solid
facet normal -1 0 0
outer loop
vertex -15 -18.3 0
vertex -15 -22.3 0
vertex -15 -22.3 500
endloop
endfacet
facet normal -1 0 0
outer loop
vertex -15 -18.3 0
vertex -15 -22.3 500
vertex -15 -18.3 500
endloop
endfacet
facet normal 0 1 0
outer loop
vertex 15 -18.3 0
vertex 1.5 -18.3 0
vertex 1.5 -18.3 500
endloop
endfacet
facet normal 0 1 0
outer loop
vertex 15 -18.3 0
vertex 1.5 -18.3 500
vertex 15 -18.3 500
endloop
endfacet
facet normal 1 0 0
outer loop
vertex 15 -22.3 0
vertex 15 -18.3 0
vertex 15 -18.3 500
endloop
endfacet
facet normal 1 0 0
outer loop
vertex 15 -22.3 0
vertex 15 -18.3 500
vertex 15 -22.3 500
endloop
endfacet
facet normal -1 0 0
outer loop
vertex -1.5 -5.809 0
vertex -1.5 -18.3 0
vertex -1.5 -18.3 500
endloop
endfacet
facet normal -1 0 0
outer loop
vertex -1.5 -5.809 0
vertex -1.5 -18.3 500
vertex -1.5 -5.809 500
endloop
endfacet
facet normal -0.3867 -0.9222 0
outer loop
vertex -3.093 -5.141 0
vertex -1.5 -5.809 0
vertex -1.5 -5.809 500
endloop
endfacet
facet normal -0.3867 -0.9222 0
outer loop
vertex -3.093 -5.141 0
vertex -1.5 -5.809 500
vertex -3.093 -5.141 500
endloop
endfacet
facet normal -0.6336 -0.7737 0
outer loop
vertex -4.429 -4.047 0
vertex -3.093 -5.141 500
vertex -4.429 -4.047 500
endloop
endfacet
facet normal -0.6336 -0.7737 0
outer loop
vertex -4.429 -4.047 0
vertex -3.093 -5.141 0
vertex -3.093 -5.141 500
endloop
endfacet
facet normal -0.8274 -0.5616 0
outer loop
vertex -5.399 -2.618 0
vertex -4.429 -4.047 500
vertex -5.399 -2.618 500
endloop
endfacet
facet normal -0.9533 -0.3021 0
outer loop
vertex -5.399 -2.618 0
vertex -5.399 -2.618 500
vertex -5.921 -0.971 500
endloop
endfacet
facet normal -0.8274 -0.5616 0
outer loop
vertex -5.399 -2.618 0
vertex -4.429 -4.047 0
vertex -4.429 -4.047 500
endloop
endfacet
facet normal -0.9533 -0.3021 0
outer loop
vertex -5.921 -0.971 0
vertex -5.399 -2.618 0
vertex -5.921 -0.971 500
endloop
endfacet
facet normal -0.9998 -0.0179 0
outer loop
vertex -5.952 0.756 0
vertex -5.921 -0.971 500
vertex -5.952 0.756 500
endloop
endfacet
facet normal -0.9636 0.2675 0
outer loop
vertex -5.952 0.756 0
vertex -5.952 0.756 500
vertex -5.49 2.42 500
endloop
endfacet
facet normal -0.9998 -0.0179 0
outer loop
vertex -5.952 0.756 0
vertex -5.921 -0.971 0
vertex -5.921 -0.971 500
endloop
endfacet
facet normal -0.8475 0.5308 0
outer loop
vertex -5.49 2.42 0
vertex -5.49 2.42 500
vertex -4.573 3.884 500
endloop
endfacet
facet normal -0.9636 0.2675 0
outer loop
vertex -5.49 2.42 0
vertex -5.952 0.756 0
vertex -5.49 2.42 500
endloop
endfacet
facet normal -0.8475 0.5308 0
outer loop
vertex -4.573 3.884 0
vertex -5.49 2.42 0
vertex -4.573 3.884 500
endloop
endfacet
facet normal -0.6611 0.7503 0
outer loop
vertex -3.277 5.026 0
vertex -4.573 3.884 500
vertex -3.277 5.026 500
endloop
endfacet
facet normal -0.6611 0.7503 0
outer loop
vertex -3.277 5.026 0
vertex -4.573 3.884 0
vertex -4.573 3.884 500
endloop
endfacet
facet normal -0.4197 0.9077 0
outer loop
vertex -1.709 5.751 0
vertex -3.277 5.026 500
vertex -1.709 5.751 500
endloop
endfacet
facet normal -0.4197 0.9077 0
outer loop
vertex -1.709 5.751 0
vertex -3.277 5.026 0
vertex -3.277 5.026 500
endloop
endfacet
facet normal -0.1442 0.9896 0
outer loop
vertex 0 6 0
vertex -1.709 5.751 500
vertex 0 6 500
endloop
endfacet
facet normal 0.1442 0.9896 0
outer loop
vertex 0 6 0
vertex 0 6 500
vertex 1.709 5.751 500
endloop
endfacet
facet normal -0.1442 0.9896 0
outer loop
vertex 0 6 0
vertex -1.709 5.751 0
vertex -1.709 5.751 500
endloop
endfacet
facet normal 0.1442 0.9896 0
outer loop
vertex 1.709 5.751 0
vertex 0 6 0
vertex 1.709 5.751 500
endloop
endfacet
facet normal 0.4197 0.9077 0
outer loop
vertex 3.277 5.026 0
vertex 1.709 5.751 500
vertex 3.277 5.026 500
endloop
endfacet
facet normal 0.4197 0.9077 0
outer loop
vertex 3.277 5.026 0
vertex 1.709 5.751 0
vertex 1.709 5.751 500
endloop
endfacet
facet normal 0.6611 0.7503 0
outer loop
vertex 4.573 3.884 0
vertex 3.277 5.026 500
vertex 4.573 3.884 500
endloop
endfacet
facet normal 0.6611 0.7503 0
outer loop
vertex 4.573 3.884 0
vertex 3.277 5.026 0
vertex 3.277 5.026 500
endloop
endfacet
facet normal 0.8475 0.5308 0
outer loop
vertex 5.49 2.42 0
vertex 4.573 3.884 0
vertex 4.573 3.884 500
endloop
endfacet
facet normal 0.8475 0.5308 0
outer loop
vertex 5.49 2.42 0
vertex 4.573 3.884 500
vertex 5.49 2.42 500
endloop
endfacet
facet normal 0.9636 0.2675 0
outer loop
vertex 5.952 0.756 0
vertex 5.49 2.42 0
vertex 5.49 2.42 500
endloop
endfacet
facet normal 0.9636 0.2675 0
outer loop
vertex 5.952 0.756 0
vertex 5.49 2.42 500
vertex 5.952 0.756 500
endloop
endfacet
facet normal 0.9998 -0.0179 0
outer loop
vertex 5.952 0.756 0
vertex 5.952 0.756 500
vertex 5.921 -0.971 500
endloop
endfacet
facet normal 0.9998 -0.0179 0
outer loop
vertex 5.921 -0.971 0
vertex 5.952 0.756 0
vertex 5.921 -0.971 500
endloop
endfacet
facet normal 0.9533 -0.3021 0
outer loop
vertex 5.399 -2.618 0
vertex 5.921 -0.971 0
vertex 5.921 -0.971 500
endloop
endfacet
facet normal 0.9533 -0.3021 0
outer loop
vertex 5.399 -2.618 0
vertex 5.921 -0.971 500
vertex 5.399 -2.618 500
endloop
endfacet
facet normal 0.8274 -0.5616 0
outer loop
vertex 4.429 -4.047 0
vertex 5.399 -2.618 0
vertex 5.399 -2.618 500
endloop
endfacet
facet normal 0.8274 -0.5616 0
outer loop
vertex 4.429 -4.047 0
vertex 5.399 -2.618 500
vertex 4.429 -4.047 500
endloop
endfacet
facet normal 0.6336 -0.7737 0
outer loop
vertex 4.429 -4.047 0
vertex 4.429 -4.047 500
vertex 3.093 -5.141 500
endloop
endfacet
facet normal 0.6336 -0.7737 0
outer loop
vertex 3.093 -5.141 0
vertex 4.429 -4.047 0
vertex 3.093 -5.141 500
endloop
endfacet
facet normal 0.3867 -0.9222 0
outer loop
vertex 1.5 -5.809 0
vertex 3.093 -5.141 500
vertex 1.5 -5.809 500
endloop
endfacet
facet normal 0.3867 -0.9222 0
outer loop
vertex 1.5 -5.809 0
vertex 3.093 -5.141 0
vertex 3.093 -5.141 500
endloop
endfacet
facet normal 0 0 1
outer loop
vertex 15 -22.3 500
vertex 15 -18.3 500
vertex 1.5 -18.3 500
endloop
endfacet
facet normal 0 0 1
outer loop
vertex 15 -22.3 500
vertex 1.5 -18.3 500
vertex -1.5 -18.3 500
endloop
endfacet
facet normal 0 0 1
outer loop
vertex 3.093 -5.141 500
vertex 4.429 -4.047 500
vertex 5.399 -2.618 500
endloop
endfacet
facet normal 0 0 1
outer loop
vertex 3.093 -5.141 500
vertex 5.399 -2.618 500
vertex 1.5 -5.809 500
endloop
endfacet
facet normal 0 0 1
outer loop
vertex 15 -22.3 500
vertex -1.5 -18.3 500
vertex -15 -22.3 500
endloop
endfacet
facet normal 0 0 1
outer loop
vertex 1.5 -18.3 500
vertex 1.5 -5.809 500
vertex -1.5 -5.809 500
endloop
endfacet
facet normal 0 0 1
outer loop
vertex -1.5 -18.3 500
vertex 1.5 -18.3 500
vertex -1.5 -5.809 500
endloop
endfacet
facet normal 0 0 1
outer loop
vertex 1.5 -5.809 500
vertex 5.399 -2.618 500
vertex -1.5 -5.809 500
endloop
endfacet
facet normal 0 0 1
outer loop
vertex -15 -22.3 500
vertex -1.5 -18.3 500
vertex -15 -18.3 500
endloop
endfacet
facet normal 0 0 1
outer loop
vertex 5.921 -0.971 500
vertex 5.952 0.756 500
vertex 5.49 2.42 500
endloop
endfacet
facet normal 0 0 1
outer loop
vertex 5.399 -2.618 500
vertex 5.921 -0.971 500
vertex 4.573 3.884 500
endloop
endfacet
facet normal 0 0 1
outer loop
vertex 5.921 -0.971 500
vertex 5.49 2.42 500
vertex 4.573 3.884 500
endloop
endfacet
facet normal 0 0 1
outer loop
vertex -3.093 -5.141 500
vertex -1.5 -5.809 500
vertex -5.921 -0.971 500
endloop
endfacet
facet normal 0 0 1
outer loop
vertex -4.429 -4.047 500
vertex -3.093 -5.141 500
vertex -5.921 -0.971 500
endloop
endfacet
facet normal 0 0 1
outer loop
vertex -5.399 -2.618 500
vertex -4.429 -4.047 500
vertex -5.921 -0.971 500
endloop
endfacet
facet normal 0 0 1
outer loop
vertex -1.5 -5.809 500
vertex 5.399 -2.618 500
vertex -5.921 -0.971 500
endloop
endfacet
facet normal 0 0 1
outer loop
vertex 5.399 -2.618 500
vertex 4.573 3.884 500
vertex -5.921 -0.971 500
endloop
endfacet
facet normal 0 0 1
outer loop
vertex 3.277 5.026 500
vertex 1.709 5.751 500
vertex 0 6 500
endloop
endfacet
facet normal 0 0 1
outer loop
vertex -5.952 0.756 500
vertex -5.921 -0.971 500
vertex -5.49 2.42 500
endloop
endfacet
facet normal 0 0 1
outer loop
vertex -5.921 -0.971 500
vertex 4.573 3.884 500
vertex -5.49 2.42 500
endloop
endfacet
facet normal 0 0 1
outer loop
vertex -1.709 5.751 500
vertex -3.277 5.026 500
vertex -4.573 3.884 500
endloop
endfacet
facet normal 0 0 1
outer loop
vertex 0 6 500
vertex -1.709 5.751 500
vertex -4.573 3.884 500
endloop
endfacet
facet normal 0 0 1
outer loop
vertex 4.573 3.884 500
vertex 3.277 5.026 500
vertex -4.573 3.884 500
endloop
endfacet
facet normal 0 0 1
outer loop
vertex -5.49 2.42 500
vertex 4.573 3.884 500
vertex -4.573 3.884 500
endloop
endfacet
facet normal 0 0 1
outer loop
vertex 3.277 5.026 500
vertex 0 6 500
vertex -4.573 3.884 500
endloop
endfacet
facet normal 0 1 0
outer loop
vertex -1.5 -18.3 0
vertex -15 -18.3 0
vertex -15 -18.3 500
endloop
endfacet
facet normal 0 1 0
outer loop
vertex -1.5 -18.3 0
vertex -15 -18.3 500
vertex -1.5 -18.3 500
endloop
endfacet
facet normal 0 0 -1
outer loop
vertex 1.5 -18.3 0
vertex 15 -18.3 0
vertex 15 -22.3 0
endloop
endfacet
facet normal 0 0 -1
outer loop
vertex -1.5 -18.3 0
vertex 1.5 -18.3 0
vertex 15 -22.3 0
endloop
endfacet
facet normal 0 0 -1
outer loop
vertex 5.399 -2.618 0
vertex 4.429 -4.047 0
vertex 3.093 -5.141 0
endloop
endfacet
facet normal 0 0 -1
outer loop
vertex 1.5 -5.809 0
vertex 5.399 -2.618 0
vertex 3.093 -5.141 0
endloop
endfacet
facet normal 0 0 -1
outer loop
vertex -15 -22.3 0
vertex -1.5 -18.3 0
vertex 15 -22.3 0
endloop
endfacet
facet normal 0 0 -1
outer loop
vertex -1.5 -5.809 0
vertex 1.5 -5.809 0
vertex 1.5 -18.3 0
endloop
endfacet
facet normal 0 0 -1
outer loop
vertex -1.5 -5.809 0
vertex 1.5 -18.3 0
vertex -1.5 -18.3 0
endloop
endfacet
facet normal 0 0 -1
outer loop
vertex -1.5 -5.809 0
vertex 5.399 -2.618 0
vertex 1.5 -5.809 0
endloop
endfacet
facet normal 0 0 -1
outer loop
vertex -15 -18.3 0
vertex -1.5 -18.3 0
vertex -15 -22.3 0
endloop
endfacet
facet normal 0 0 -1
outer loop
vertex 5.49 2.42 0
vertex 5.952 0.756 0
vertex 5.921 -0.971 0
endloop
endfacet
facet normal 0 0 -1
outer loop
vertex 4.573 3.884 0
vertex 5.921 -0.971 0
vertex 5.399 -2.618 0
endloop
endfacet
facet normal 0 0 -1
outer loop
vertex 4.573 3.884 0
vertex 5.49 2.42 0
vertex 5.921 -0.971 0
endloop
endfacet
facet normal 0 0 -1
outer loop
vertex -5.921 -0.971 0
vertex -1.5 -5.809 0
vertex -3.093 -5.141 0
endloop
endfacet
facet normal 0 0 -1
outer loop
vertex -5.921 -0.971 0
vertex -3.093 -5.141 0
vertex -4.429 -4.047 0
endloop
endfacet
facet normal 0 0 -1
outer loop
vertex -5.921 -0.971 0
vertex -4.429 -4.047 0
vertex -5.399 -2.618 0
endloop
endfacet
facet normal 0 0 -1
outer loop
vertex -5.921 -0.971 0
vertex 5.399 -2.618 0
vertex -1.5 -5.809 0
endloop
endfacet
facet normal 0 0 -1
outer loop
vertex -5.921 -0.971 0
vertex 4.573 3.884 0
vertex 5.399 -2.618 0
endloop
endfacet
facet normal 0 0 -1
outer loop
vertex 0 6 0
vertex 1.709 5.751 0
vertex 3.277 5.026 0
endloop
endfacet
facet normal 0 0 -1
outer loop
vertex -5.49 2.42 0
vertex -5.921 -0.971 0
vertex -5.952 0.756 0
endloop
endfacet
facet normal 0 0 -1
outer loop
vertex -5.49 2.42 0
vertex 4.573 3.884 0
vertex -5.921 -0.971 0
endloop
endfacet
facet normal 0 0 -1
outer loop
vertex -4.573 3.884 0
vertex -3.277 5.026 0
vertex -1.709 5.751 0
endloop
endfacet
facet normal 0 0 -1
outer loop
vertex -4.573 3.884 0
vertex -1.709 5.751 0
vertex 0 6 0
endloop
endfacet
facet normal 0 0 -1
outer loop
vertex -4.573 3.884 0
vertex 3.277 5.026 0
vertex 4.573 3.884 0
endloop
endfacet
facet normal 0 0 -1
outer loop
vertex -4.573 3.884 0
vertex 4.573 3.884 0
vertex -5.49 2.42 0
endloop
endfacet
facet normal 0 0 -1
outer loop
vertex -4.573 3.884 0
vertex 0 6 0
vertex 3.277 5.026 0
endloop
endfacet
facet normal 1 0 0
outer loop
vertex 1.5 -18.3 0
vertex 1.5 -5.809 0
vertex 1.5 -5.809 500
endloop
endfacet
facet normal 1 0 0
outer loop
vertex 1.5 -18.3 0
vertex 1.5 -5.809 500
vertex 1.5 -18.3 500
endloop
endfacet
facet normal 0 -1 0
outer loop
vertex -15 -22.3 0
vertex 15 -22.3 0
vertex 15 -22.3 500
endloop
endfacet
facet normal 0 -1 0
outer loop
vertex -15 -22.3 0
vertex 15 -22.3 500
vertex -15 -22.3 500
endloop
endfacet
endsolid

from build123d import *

# Parameters (mm, degrees)
BOSS_EXTRUDE1_DEPTH = 500


with BuildPart() as part:
    # Sketch1 → Boss-Extrude1 (new body)
    with BuildSketch(Plane.XY):
        with BuildLine():
            Line((1.5, -18.3), (15, -18.3))
            Line((15, -18.3), (15, -22.3))
            Line((15, -22.3), (-15, -22.3))
            Line((-15, -22.3), (-15, -18.3))
            Line((-15, -18.3), (-1.5, -18.3))
            Line((-1.5, -18.3), (-1.5, -5.809475019))
            ThreePointArc((-1.5, -5.809475019), (0, 6), (1.5, -5.809475019))
            Line((1.5, -5.809475019), (1.5, -18.3))
        make_face()
    extrude(amount=BOSS_EXTRUDE1_DEPTH)


solid = part.part
